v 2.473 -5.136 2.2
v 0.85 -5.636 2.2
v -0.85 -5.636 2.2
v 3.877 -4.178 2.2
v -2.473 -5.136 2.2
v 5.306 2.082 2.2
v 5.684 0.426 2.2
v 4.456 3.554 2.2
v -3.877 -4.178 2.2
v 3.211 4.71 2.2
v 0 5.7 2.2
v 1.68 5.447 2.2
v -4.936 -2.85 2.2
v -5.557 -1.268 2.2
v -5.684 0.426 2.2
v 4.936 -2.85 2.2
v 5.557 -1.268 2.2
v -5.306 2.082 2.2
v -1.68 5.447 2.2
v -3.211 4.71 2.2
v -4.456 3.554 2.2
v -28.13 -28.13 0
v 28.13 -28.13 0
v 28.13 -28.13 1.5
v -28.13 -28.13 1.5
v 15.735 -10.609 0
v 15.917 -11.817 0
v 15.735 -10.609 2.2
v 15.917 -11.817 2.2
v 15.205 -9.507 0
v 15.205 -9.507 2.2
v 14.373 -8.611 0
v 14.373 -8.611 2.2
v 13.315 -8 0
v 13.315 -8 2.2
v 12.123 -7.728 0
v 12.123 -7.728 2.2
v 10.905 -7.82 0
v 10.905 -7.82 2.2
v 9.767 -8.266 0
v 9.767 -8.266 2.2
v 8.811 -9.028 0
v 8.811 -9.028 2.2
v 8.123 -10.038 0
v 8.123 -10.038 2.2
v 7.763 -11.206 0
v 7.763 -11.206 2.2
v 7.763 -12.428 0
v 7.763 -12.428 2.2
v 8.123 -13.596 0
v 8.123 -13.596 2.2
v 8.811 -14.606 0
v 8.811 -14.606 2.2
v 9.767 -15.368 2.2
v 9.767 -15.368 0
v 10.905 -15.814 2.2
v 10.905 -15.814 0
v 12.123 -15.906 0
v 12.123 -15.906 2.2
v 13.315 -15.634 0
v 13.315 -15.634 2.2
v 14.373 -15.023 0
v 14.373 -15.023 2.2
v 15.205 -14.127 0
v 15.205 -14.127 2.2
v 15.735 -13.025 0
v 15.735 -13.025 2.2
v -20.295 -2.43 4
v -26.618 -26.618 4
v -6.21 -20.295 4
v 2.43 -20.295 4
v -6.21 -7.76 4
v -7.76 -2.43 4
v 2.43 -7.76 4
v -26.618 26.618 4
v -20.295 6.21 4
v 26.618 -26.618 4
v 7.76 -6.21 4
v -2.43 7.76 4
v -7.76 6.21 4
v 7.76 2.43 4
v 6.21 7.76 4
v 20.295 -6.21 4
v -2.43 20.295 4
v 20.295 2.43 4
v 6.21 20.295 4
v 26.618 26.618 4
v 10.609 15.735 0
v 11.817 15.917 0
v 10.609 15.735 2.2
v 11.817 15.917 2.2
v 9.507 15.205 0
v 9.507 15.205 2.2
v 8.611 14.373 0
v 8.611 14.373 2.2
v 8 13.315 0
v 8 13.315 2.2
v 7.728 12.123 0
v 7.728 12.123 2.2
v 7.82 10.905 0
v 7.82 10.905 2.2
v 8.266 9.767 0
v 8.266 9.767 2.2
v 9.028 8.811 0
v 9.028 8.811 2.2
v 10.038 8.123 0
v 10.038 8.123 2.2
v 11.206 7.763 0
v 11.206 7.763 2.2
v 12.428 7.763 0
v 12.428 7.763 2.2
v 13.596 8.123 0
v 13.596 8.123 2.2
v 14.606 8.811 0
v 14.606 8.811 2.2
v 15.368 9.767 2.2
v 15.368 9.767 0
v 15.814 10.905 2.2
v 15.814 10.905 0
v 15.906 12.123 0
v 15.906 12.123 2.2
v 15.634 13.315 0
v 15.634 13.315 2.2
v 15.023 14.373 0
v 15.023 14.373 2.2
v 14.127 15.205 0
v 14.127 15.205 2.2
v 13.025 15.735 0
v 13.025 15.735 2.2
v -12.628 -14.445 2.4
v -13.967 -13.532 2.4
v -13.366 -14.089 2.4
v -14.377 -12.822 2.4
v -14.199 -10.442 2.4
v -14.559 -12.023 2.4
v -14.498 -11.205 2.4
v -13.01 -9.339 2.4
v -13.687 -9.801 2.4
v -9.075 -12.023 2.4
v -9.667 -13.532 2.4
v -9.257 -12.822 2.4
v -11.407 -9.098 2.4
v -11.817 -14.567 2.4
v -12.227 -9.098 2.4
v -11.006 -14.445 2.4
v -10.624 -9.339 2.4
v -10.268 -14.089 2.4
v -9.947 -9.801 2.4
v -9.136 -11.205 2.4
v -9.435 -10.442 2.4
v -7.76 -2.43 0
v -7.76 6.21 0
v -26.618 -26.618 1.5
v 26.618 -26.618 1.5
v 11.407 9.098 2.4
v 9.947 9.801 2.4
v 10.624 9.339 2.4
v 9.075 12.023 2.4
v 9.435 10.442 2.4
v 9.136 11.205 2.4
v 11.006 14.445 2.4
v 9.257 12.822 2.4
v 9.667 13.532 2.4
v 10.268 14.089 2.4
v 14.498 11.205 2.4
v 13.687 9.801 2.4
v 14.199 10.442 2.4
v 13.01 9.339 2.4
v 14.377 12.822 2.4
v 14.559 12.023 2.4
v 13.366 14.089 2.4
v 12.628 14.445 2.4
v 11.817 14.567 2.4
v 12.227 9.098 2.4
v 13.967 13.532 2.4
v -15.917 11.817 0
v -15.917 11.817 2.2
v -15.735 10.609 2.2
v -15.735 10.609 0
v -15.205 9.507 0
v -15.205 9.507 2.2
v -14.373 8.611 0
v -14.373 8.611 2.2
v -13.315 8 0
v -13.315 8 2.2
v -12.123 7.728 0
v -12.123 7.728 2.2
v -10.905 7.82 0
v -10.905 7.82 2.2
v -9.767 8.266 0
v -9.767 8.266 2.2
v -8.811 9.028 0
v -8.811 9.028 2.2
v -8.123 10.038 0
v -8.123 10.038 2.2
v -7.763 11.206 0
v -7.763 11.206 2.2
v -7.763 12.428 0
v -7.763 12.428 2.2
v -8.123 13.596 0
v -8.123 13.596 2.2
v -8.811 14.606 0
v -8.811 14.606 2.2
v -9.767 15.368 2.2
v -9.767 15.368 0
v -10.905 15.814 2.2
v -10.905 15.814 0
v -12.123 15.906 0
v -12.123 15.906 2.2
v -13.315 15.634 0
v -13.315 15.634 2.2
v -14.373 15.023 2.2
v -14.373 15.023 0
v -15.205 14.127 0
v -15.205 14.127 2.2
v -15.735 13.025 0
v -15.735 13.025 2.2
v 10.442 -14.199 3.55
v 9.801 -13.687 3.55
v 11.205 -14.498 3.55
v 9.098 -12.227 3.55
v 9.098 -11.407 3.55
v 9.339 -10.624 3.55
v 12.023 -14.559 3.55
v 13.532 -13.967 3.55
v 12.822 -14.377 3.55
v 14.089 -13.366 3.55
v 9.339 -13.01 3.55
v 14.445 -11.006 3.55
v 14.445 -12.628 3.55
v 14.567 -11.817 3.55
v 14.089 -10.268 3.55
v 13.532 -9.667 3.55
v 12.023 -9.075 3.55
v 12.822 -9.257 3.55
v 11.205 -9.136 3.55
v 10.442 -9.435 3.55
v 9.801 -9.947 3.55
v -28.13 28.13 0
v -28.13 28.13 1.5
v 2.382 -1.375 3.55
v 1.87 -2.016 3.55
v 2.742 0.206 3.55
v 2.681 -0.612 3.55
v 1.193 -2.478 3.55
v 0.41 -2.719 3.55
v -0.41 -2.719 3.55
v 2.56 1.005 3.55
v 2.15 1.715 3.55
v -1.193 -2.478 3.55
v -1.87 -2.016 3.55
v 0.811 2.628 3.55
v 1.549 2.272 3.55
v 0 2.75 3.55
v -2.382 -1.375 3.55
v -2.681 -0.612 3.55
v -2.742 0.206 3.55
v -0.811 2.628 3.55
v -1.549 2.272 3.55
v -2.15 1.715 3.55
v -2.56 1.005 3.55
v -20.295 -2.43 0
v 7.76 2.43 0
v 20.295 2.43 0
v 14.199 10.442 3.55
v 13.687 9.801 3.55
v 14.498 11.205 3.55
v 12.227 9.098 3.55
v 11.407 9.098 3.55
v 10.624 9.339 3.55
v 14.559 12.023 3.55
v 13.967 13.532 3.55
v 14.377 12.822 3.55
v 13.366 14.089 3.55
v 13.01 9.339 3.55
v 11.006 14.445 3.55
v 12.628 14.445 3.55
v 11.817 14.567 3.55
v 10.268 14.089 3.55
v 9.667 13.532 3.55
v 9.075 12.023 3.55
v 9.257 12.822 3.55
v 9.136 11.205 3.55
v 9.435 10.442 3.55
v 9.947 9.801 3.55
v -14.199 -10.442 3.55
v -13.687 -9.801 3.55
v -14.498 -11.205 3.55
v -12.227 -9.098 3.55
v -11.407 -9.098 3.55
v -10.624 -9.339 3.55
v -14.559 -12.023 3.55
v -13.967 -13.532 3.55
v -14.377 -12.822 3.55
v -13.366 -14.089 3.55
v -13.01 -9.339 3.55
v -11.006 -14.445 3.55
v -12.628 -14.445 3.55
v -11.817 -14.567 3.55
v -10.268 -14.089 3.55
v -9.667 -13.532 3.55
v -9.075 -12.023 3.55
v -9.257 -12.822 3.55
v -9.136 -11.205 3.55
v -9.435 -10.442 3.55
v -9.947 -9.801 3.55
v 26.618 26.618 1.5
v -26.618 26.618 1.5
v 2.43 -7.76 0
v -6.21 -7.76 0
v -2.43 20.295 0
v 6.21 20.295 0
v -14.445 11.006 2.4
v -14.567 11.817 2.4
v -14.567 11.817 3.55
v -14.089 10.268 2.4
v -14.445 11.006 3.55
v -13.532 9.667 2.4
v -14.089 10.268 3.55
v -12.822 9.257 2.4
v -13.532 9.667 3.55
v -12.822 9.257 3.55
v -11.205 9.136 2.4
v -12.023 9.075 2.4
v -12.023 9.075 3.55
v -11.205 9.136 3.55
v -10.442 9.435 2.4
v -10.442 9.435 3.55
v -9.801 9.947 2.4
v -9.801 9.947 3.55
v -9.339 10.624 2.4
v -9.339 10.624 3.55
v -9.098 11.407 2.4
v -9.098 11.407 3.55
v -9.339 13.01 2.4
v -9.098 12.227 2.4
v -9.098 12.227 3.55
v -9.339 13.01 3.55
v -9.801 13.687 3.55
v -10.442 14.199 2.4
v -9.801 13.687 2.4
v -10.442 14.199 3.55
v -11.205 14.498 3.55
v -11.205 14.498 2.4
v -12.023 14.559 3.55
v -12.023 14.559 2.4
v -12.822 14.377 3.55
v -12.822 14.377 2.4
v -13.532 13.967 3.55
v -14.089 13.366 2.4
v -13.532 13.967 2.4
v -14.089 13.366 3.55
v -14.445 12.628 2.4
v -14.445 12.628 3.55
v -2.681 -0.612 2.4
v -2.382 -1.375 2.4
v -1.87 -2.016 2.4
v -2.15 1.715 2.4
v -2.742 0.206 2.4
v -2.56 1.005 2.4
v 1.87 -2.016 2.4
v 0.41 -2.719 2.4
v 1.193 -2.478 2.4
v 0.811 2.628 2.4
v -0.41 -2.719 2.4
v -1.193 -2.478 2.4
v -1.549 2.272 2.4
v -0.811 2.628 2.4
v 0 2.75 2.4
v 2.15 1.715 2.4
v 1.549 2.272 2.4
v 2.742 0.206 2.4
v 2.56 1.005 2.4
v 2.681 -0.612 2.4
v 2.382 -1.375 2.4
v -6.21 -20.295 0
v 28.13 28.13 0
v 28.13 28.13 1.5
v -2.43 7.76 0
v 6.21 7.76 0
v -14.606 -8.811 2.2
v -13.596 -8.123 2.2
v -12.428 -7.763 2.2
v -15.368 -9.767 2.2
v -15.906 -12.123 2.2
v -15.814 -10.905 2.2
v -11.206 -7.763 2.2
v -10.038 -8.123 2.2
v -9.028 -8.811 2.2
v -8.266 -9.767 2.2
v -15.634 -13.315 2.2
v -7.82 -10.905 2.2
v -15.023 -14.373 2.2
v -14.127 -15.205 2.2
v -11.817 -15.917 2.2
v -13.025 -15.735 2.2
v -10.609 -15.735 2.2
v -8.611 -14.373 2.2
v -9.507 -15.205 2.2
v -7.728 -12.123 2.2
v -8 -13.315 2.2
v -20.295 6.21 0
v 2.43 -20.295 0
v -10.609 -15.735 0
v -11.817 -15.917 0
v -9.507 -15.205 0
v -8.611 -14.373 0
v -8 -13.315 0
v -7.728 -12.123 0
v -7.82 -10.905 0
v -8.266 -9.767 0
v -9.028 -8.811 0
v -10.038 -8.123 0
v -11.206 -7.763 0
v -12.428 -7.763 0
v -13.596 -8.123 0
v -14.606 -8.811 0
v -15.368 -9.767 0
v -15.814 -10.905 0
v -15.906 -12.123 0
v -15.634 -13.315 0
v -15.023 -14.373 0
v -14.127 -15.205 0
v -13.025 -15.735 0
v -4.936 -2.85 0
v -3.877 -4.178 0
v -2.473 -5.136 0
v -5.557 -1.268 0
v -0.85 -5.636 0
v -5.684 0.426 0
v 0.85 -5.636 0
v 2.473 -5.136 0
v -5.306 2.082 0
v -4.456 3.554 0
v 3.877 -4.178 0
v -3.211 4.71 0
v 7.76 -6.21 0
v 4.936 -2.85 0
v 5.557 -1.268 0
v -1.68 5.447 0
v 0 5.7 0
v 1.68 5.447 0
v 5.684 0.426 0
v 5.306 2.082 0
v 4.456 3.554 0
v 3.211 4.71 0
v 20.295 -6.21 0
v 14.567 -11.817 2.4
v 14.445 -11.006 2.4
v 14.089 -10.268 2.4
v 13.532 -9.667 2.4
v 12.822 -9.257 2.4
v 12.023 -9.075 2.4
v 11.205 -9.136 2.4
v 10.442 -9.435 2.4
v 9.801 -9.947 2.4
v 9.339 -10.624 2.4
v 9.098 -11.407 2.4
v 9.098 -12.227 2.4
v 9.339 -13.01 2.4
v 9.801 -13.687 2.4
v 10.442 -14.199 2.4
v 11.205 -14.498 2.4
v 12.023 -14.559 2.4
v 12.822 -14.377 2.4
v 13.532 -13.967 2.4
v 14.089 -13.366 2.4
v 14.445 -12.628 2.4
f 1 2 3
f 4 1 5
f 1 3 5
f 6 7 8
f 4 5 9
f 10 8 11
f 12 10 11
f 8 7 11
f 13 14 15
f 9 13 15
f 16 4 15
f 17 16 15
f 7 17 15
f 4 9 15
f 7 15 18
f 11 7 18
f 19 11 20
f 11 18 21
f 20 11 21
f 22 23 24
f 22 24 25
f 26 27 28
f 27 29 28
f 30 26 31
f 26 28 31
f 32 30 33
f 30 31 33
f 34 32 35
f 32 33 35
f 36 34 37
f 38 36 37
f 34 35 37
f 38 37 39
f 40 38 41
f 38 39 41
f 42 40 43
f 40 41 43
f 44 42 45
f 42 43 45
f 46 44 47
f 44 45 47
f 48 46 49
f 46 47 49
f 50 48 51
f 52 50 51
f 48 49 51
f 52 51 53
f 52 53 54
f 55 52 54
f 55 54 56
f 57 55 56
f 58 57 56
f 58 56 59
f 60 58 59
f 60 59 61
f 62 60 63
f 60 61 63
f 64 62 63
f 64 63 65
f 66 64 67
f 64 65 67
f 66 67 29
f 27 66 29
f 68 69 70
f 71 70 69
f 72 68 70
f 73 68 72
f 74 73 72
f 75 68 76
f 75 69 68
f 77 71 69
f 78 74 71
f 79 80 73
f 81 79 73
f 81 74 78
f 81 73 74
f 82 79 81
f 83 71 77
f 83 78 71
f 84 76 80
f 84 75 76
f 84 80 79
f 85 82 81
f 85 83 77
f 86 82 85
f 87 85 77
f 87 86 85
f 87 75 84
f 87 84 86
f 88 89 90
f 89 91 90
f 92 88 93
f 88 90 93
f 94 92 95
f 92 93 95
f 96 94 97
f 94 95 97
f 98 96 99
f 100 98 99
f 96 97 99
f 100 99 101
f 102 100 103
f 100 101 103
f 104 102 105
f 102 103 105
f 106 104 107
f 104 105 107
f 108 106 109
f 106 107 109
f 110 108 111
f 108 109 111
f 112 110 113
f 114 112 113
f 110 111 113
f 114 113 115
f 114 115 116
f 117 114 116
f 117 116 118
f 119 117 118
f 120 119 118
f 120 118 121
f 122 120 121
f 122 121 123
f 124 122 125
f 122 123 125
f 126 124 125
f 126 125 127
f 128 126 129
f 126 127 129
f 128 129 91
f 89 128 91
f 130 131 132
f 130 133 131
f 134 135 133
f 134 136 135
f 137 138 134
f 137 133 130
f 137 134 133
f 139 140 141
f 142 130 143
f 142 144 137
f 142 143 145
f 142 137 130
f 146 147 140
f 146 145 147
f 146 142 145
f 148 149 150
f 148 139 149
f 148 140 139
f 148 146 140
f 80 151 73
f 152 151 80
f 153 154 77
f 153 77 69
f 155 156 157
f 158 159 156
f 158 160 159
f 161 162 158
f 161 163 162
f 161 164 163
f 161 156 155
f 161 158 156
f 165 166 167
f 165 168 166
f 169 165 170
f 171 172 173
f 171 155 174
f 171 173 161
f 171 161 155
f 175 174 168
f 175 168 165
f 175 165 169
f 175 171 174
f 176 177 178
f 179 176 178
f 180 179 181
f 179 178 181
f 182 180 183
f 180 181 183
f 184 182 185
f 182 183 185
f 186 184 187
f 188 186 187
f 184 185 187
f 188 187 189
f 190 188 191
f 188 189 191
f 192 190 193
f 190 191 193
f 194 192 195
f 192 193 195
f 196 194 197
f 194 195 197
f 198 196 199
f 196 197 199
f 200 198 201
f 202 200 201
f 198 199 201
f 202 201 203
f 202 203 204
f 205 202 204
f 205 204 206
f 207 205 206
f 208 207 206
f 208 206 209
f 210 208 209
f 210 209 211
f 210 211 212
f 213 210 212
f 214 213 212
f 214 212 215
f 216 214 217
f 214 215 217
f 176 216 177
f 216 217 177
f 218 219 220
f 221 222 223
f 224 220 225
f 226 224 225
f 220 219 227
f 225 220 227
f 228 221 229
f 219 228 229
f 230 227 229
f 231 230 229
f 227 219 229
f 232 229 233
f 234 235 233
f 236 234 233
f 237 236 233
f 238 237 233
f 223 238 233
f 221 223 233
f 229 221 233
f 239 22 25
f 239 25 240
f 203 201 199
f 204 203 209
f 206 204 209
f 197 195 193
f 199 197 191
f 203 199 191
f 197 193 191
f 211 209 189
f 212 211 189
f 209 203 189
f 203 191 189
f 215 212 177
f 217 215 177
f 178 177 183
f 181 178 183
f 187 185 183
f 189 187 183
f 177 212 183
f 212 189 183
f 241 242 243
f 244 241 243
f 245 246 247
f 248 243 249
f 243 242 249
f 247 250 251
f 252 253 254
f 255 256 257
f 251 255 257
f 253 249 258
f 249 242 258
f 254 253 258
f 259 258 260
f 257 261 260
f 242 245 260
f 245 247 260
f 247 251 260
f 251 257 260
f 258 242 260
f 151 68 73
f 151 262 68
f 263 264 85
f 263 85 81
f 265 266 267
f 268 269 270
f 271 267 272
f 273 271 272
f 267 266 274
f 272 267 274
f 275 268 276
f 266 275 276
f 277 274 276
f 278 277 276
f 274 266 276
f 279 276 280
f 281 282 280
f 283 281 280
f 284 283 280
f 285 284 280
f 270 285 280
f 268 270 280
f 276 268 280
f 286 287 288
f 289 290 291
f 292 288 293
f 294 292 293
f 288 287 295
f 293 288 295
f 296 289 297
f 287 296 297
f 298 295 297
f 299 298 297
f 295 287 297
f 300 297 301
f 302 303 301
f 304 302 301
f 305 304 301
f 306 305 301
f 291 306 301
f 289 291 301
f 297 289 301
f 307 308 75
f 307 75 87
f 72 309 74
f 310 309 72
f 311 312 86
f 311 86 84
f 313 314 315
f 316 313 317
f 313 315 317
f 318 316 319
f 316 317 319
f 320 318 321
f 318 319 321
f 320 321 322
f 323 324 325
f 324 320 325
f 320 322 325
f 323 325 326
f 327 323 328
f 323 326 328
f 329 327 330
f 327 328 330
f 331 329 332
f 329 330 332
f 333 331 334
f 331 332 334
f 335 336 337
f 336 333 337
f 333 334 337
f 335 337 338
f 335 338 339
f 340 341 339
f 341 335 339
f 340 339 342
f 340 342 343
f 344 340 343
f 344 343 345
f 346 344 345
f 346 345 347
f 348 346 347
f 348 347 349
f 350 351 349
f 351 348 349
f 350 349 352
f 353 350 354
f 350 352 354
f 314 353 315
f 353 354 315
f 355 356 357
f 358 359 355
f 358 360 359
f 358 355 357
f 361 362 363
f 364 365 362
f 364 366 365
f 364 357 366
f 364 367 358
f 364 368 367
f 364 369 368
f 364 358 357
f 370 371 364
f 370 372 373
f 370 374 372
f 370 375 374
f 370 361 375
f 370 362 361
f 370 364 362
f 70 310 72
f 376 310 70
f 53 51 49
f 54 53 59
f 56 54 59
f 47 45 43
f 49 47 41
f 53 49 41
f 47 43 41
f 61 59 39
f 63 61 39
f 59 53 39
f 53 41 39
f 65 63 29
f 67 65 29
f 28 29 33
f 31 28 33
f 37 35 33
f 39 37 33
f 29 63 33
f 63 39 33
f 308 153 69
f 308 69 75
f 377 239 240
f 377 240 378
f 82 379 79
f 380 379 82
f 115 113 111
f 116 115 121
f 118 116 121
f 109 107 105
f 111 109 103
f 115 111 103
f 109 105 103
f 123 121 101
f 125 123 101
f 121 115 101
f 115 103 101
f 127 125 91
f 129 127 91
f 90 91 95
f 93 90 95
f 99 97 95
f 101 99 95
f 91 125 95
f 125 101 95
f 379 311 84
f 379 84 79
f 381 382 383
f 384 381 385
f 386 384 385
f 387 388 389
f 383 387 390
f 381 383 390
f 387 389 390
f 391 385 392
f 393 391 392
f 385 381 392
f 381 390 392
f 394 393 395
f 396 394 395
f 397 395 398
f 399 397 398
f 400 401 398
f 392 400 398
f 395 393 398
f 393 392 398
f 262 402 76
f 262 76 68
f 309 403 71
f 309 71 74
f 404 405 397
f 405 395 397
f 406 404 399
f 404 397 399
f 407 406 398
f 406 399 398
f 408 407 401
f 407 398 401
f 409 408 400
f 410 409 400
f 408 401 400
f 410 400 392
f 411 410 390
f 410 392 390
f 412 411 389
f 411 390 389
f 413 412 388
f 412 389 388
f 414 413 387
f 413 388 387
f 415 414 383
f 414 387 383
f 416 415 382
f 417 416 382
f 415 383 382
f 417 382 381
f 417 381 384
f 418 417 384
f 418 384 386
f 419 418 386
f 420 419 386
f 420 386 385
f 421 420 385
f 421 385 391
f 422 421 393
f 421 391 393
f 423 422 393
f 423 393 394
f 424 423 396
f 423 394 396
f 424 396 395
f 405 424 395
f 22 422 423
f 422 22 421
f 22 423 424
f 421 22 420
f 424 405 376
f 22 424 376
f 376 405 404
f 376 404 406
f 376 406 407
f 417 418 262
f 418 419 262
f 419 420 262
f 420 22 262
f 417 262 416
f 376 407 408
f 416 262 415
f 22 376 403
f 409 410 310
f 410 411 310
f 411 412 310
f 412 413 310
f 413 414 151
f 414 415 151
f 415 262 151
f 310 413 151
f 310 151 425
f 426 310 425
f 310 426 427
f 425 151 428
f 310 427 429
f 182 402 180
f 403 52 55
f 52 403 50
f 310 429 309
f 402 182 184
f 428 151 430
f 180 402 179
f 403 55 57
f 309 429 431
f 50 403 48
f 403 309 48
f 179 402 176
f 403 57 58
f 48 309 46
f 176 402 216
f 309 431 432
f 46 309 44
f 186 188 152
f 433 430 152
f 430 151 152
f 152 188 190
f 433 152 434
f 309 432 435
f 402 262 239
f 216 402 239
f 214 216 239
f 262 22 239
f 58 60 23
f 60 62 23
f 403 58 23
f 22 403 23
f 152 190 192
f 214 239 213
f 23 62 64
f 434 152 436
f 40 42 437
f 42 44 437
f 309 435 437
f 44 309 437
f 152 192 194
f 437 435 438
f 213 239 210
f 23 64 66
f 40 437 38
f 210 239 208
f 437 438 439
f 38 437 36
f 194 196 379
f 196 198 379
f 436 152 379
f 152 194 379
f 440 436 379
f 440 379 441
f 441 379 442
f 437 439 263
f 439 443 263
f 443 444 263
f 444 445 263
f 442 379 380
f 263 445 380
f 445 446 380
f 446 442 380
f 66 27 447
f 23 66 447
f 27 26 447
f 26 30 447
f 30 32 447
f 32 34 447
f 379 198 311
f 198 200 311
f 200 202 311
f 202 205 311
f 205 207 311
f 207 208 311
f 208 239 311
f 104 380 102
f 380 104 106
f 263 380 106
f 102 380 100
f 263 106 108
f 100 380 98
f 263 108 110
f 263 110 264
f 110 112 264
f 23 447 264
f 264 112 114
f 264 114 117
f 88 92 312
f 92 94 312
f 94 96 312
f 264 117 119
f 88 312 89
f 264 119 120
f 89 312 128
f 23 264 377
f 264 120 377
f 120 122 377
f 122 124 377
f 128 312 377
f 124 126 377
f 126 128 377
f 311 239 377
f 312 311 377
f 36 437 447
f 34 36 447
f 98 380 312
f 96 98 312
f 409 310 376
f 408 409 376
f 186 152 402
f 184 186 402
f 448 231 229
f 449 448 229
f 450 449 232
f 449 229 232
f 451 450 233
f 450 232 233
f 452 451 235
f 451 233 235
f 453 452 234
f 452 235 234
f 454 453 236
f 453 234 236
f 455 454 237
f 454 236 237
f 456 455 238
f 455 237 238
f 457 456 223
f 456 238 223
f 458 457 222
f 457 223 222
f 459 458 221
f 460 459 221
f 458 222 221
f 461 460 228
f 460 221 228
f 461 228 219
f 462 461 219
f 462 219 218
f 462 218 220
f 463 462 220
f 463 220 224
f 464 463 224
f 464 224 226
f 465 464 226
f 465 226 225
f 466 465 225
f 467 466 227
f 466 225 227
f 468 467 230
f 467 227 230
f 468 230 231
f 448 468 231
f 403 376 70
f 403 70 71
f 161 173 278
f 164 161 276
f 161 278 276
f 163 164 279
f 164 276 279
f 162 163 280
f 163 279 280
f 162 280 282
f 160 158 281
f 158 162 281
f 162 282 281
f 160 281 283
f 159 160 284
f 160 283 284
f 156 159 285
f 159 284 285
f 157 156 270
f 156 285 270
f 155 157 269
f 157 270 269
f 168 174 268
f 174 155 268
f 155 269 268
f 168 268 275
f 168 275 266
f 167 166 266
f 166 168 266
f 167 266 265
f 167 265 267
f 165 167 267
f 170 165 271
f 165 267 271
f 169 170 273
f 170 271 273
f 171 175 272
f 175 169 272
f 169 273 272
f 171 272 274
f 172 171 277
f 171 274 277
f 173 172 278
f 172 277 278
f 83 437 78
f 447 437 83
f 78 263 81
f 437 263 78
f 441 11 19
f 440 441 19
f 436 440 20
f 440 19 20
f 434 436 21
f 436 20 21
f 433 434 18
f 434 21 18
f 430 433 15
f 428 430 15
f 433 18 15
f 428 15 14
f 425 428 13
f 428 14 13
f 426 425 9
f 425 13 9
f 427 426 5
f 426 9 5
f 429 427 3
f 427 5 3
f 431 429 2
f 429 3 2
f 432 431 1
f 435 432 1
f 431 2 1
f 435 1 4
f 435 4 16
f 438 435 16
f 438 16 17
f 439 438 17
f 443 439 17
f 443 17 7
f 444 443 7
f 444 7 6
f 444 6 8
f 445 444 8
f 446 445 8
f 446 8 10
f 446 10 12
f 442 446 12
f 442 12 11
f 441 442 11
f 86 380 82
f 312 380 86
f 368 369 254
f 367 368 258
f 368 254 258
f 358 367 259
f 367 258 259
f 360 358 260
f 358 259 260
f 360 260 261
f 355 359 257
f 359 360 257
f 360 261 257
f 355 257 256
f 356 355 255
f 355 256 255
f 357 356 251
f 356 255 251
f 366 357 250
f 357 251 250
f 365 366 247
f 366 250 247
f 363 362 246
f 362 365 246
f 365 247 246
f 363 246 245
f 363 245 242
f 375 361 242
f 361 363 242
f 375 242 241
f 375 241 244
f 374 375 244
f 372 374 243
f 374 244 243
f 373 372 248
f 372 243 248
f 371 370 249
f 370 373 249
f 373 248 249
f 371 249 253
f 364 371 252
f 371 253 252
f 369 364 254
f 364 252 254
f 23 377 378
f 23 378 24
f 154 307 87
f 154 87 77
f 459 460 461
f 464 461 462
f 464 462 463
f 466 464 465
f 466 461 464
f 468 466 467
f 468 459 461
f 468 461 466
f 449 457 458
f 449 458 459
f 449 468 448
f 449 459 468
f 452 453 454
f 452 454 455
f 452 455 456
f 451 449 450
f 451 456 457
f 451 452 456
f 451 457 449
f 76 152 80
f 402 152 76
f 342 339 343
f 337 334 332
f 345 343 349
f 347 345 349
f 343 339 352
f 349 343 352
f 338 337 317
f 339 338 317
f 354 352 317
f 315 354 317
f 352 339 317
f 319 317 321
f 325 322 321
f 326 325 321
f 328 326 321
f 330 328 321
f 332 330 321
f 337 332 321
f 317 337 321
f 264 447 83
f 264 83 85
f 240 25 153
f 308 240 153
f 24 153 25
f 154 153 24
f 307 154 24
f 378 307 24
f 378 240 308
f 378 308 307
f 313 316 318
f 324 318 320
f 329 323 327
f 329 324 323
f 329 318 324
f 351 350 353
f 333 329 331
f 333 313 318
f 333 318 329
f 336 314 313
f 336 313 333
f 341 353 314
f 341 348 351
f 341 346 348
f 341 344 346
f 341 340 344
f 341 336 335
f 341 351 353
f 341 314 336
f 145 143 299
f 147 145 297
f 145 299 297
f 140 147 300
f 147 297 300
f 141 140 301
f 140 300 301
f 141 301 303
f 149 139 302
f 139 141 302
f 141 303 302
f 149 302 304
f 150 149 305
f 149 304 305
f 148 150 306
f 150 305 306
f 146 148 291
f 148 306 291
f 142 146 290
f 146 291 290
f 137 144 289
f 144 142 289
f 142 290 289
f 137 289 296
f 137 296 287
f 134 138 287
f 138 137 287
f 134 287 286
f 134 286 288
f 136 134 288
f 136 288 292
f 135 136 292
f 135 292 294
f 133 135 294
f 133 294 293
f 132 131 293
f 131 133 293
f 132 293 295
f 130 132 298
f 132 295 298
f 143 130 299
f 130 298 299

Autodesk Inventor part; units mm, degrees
ref_plane "YZ Plane" through (0, 0, 0) normal (1, 0, 0) x (0, 1, 0)
ref_plane "XZ Plane" through (0, 0, 0) normal (0, 1, 0) x (-1, 0, 0)
sketch "Skizze1" plane through (0, 0, 0) normal (0, 0, 1) x (1, 0, 0)
  line L0 (-28.13, 28.13) -> (28.13, 28.13)
  line L1 (28.13, 28.13) -> (28.13, -28.13)
  line L2 (28.13, -28.13) -> (-28.13, -28.13)
  line L3 (-28.13, -28.13) -> (-28.13, 28.13)
  line L4 (-39.382, 0) -> (39.382, 0) construction
  line L5 (0, -39.382) -> (0, 39.382) construction
  point P0 (0, 0)
  dimension "d0" = 56.26
extrude "Extrusion1" add sketch "Skizze1" along normal blind 1.5
sketch "Skizze2" plane through (0, 0, 1.5) normal (0, 0, 1) x (1, 0, 0)
  line L0 (0, -39.382) -> (0, 39.382) construction
  line L1 (-39.382, 0) -> (39.382, 0) construction
  line L2 (-26.6175, 26.6175) -> (26.6175, 26.6175)
  line L3 (26.6175, 26.6175) -> (26.6175, -26.6175)
  line L4 (26.6175, -26.6175) -> (-26.6175, -26.6175)
  line L5 (-26.6175, -26.6175) -> (-26.6175, 26.6175)
  line L6 (28.13, 28.13) -> (-28.13, 28.13) projected
  point P0 (0, 0)
  dimension "d3" = 53.235
extrude "Extrusion2" add sketch "Skizze2" along normal blind 2.5
sketch "Skizze3" plane through (0, 0, 0) normal (0, 0, -1) x (-1, 0, 0)
  line L0 (28.13, -28.13) -> (-28.13, -28.13) projected
  line L1 (28.13, 28.13) -> (28.13, -28.13) projected
  line L2 (-28.13, 28.13) -> (28.13, 28.13) projected
  line L3 (-28.13, -28.13) -> (-28.13, 28.13) projected
  line L4 (-6.21, 20.295) -> (2.43, 20.295)
  line L5 (2.43, 20.295) -> (2.43, 7.76)
  line L6 (2.43, 7.76) -> (-6.21, 7.76)
  line L7 (-6.21, 7.76) -> (-6.21, 20.295)
  point P0 (0, 0)
  point P1 (0, 0)
  dimension "d6" = 21.92
  dimension "d7" = 8.64
  dimension "d8" = 12.535
  dimension "d9" = 35.89
extrude "Extrusion3" cut sketch "Skizze3" against normal up to surface (4 mm away) contours L4 L5 L6 L7
pattern_circular "Runde Anordnung1" count 4 over 360 about axis through (0, 0, -10) along (0, 0, 1) of "Extrusion3"
sketch "Skizze4" plane through (0, 0, 0) normal (0, 0, -1) x (-1, 0, 0)
  line L0 (-28.13, -28.13) -> (-28.13, 28.13) projected
  line L1 (-28.13, 28.13) -> (28.13, 28.13) projected
  point P0 (0, 0)
  point P1 (-11.817, 11.817)
  dimension "d15" = 16.313
  dimension "d16" = 16.313
hole "Bohrung1" at (11.817, 11.817, 0) direction (0, 0, 1) diameter 5.5 depth 3.55 counterbore diameter 8.2 counterbore depth 2.2
pattern_circular "Runde Anordnung2" count 4 over 360 about axis through (0, 0, -10) along (0, 0, 1) of "Bohrung1"
sketch "Skizze5" plane through (0, 0, 0) normal (0, 0, -1) x (-1, 0, 0)
  point P0 (0, 0)
  point P1 (0, 0)
hole "Bohrung2" at (0, 0, 0) direction (0, 0, 1) diameter 5.5 depth 3.55 counterbore diameter 11.4 counterbore depth 2.2
ref_plane "Arbeitsebene1" through (0, 0, 2.2) normal (0, 0, 1) x (1, 0, 0)
sketch "Skizze6" plane through (0, 0, 2.2) normal (0, 0, 1) x (1, 0, 0)
  circle A0 centre (-11.817, -11.817) radius 2.75 projected
  circle A1 centre (-11.817, 11.817) radius 2.75 projected
  circle A2 centre (11.817, 11.817) radius 2.75 projected
  circle A3 centre (11.817, -11.817) radius 2.75 projected
  circle A4 centre (0, 0) radius 2.75 projected
extrude "Extrusion4" add sketch "Skizze6" along normal blind 0.2
properties part number "PCB_coverPlatte_MagnetEingefasst"
